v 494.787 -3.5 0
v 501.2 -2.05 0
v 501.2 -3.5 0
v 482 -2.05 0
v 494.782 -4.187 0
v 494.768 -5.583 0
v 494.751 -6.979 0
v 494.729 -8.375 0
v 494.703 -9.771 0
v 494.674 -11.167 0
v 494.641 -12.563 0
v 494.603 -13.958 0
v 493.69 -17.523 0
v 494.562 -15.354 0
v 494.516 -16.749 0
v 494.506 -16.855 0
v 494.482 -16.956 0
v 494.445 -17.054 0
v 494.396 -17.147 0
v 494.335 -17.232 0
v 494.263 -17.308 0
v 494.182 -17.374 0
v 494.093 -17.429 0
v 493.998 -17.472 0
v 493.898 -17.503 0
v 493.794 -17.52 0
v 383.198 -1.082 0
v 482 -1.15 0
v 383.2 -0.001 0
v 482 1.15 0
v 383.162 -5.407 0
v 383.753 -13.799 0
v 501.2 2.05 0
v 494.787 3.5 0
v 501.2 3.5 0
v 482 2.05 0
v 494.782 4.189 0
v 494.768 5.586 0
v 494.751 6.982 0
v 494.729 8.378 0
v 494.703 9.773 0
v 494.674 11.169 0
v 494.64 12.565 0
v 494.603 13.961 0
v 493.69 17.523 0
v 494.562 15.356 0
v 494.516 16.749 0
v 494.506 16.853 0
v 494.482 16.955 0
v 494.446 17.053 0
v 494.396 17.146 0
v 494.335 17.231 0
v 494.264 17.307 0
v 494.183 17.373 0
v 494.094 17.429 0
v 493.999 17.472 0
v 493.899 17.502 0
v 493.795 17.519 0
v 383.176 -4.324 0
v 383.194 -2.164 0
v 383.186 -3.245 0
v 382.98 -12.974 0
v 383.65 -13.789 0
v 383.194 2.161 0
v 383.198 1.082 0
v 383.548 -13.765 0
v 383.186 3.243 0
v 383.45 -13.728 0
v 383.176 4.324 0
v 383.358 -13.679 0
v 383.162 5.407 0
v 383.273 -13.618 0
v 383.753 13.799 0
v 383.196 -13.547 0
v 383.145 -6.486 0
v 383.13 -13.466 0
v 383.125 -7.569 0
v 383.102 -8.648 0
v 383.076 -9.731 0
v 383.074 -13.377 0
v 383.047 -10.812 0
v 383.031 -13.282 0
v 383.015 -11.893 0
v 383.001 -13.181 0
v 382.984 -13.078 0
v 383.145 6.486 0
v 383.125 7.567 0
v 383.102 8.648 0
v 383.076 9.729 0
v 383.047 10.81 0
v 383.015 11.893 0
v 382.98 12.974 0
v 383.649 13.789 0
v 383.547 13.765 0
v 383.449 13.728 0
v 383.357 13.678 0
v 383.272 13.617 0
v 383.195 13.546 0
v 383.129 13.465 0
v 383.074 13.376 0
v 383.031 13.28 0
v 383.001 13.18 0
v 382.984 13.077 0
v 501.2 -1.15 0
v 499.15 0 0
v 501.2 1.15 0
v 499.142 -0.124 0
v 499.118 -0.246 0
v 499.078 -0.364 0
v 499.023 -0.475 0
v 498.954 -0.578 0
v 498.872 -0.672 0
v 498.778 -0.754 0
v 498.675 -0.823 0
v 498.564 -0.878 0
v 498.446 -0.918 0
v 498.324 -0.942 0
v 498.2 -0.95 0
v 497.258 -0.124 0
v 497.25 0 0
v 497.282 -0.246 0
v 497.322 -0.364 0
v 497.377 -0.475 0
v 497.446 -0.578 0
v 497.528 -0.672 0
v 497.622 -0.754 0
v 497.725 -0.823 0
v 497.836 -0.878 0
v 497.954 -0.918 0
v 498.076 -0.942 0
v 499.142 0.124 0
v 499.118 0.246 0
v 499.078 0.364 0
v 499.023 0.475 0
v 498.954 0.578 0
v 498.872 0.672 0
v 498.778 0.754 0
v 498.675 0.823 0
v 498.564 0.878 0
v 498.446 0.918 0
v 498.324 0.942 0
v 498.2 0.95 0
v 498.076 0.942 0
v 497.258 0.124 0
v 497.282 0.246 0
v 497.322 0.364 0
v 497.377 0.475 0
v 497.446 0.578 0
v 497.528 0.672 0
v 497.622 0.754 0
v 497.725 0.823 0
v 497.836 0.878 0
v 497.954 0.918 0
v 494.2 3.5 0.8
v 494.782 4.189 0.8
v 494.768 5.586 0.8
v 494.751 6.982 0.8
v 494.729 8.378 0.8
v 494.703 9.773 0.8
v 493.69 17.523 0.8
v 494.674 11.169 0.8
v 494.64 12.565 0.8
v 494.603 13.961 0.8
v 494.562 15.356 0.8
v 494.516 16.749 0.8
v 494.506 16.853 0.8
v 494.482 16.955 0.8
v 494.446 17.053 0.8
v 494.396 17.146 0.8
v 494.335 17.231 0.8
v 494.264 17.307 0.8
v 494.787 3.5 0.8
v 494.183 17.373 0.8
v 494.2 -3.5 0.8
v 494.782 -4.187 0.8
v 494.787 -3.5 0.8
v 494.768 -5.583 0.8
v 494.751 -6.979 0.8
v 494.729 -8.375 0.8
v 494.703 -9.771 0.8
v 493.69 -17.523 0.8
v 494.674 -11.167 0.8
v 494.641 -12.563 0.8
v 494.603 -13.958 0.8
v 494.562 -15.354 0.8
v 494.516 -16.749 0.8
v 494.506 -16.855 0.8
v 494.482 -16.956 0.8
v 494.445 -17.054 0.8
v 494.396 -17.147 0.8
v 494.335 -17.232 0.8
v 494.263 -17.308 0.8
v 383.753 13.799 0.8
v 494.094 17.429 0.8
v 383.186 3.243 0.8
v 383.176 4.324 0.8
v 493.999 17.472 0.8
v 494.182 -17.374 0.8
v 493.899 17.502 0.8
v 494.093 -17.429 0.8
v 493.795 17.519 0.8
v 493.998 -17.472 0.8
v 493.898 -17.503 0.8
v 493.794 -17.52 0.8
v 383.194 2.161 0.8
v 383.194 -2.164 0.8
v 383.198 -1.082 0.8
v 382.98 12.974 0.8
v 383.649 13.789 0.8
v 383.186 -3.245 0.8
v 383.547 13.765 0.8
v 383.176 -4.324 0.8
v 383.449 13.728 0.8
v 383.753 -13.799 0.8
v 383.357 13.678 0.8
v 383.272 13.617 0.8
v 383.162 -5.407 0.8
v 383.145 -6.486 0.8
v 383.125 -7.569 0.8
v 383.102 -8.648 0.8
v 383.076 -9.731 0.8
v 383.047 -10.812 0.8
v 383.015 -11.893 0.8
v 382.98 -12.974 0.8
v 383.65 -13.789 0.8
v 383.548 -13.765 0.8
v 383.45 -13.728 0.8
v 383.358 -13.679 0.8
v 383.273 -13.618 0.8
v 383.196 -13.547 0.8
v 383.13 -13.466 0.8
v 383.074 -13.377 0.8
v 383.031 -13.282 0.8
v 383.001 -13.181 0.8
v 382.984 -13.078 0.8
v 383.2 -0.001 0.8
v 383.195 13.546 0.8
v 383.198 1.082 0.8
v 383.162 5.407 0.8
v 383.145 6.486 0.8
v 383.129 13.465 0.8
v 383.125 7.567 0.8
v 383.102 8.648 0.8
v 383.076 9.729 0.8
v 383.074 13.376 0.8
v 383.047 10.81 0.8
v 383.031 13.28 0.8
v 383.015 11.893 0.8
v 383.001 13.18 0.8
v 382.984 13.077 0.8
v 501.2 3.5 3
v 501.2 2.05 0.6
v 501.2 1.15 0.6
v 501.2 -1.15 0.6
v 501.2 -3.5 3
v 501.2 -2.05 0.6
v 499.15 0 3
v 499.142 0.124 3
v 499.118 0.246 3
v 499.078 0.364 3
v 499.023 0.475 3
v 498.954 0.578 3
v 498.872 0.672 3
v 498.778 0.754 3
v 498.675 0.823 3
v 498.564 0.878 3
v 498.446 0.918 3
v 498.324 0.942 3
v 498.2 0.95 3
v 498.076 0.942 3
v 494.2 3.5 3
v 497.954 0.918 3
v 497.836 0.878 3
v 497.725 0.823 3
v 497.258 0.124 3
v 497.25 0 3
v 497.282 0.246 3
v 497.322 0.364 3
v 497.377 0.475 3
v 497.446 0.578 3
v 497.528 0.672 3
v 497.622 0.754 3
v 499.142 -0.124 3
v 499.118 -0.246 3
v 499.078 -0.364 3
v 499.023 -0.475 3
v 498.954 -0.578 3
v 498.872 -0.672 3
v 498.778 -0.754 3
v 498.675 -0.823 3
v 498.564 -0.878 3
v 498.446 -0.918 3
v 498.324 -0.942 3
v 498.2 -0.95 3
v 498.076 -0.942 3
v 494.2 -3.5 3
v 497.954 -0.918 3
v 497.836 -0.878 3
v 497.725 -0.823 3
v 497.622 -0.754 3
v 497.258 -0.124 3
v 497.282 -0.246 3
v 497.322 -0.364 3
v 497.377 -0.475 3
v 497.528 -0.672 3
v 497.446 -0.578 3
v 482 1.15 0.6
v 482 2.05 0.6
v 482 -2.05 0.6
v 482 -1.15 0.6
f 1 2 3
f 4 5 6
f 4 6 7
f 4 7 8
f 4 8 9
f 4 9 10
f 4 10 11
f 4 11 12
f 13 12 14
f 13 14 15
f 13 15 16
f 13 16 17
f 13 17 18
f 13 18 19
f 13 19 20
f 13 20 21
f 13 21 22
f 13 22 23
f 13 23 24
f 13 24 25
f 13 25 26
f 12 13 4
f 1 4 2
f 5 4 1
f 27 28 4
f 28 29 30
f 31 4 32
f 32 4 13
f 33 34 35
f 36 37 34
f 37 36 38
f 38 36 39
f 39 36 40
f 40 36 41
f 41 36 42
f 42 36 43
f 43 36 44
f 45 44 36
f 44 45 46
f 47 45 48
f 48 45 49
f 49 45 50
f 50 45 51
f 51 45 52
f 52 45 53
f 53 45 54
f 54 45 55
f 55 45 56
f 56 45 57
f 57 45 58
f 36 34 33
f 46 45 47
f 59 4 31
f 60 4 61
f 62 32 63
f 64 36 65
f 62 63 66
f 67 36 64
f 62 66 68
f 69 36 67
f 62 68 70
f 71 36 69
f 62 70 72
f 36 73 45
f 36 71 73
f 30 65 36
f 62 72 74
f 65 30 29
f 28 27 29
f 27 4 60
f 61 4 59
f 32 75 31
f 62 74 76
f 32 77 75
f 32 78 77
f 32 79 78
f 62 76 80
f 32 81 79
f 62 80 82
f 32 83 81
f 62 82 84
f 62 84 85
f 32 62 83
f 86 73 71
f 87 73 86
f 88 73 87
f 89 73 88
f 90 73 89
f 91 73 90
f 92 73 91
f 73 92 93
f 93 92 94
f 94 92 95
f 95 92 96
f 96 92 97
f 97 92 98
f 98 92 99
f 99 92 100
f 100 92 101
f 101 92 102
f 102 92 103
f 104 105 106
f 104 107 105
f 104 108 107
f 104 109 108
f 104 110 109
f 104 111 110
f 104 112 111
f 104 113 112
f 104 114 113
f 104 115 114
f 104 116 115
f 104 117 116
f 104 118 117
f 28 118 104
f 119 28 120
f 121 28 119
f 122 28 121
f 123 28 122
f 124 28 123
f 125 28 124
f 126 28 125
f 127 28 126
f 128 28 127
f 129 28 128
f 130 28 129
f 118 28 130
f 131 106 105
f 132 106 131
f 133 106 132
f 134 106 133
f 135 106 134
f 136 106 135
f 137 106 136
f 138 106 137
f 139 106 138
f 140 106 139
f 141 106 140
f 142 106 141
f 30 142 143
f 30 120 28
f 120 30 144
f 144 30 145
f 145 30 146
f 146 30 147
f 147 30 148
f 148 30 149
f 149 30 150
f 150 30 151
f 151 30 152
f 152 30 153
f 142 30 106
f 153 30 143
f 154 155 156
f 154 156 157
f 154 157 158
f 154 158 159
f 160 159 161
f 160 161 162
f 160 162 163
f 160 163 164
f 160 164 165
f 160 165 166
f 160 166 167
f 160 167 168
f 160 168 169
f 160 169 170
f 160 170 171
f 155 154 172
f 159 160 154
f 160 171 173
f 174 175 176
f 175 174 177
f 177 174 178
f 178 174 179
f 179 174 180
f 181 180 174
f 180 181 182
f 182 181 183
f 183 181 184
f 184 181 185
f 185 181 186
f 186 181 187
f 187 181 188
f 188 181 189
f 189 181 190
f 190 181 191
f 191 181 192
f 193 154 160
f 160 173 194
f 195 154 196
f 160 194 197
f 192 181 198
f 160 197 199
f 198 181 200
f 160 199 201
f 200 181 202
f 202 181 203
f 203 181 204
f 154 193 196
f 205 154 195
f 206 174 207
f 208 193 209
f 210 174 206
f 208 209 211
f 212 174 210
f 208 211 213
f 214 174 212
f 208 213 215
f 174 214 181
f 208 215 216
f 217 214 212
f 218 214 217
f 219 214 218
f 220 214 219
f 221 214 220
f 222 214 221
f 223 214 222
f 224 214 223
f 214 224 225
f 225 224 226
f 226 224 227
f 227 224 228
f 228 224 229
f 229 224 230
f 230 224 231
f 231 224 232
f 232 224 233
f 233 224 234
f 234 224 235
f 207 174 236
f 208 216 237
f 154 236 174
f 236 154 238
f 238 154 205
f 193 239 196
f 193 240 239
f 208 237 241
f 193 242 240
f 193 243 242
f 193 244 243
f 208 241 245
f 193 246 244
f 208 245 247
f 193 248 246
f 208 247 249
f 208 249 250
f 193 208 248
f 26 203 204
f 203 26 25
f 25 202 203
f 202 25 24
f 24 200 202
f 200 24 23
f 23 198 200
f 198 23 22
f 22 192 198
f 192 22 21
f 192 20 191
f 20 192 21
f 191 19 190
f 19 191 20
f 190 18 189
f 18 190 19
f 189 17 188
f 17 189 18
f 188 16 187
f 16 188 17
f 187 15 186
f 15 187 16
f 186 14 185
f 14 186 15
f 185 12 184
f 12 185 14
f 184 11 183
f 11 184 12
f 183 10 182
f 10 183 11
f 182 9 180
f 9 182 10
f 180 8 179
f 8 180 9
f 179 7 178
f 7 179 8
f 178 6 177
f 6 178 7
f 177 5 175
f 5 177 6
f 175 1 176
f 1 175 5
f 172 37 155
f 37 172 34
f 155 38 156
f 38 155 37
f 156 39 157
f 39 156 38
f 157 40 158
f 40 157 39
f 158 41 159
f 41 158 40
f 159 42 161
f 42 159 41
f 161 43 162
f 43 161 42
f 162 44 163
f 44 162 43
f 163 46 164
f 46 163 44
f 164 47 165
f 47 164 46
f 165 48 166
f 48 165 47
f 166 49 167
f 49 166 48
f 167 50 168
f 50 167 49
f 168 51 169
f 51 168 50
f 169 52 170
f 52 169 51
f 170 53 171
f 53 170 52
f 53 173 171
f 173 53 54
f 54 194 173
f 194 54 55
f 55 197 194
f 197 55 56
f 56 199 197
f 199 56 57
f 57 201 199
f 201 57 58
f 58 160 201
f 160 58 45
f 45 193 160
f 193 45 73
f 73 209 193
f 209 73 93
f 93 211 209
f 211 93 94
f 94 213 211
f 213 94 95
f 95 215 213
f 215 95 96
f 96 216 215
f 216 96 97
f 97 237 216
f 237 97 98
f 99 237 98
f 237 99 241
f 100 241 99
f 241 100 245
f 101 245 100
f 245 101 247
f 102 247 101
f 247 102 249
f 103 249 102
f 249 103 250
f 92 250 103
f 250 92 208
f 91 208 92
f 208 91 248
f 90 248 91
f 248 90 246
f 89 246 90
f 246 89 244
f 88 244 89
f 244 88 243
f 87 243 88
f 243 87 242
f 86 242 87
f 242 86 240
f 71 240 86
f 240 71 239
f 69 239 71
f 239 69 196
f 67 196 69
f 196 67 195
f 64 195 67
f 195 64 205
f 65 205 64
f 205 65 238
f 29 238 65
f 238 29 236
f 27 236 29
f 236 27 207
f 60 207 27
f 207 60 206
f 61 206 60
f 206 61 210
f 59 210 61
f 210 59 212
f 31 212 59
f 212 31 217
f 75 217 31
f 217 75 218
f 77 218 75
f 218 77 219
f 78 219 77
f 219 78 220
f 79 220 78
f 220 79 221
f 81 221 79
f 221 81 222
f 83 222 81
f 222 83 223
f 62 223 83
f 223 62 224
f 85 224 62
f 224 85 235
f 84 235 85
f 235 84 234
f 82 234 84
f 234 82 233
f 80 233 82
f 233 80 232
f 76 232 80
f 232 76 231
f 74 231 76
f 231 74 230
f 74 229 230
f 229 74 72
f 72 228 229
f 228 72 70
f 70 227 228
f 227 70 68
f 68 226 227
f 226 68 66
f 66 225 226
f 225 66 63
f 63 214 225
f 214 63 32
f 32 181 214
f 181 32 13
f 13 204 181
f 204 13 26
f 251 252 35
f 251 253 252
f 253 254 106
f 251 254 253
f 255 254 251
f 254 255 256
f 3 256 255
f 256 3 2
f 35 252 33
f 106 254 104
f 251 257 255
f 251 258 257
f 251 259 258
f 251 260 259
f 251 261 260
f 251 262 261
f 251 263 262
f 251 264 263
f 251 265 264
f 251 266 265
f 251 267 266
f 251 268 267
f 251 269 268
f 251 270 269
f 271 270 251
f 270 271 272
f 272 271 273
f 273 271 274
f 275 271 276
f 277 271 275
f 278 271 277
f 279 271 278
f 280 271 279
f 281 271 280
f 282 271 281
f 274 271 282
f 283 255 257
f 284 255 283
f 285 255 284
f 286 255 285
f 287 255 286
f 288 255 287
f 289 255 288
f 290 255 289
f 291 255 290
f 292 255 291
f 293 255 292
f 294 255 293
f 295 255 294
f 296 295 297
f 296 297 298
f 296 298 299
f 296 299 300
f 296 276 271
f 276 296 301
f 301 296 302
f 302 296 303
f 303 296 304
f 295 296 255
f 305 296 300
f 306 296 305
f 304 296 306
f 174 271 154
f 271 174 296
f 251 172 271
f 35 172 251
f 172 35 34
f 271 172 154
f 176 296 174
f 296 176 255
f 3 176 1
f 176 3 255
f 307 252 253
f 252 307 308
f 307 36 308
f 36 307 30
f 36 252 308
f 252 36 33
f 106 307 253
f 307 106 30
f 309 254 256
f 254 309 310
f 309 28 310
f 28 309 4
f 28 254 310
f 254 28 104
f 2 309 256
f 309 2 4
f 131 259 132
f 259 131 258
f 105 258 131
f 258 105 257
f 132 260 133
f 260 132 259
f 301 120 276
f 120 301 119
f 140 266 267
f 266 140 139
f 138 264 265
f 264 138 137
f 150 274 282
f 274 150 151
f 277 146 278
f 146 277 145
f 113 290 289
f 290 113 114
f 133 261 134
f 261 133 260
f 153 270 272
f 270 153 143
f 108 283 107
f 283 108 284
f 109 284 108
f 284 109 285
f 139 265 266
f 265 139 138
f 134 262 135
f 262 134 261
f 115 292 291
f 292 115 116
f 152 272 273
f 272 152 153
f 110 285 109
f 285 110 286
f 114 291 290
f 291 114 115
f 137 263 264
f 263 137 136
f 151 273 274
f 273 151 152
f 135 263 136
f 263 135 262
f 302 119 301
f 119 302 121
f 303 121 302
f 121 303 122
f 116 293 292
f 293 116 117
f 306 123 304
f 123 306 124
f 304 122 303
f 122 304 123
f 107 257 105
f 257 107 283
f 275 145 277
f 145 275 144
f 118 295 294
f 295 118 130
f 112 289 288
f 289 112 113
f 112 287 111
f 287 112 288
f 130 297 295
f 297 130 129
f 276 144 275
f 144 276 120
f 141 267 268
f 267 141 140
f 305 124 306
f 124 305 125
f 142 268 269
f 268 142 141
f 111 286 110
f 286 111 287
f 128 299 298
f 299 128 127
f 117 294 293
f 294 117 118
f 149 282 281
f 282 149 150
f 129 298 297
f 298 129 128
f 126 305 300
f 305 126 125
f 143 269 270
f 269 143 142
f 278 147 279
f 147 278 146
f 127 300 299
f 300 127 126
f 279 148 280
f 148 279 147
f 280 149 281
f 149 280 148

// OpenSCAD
// Gen-EE — bobbin LID (top flange + locating tab). Print x12, flange face DOWN on the bed.
// CA-glue onto the hub top BEFORE winding. Tab = lap joint into the stator tab pocket; 1.75 mm filament
// pin through pin hole + stator ledge, trim flush. Lead slots carry both leads flush.
include <parameters.scad>;
$fn = 48;
module sector_2d(r_in, r_out, ang) {
    polygon([
        for (a = [-ang/2 : ang/24 : ang/2]) [r_in*cos(a), r_in*sin(a)],
        for (a = [ang/2 : -ang/24 : -ang/2]) [r_out*cos(a), r_out*sin(a)]
    ]);
}
module footprint_2d() { offset(r=wall) sector_2d(coil_id_r, coil_od_r, span_deg); }
module hub_2d()       { offset(delta=-coil_core_inset) sector_2d(coil_id_r, coil_od_r, span_deg); }

difference() {
    union() {
        linear_extrude(flange_t) footprint_2d();
        translate([coil_od_r + 0.2, -tab_w/2, 0]) cube([tab_len, tab_w, tab_h]);
    }
    translate([coil_mount_r, 0, -0.1]) cylinder(d=pin_d, h=tab_h + 1);
    for (y = [lead_y, -lead_y])
        translate([coil_od_r - coil_core_inset - 0.5, y - lead_slot_w/2, -0.1])
            cube([coil_core_inset + tab_len + 2, lead_slot_w, lead_groove_d + 0.1]);
}
